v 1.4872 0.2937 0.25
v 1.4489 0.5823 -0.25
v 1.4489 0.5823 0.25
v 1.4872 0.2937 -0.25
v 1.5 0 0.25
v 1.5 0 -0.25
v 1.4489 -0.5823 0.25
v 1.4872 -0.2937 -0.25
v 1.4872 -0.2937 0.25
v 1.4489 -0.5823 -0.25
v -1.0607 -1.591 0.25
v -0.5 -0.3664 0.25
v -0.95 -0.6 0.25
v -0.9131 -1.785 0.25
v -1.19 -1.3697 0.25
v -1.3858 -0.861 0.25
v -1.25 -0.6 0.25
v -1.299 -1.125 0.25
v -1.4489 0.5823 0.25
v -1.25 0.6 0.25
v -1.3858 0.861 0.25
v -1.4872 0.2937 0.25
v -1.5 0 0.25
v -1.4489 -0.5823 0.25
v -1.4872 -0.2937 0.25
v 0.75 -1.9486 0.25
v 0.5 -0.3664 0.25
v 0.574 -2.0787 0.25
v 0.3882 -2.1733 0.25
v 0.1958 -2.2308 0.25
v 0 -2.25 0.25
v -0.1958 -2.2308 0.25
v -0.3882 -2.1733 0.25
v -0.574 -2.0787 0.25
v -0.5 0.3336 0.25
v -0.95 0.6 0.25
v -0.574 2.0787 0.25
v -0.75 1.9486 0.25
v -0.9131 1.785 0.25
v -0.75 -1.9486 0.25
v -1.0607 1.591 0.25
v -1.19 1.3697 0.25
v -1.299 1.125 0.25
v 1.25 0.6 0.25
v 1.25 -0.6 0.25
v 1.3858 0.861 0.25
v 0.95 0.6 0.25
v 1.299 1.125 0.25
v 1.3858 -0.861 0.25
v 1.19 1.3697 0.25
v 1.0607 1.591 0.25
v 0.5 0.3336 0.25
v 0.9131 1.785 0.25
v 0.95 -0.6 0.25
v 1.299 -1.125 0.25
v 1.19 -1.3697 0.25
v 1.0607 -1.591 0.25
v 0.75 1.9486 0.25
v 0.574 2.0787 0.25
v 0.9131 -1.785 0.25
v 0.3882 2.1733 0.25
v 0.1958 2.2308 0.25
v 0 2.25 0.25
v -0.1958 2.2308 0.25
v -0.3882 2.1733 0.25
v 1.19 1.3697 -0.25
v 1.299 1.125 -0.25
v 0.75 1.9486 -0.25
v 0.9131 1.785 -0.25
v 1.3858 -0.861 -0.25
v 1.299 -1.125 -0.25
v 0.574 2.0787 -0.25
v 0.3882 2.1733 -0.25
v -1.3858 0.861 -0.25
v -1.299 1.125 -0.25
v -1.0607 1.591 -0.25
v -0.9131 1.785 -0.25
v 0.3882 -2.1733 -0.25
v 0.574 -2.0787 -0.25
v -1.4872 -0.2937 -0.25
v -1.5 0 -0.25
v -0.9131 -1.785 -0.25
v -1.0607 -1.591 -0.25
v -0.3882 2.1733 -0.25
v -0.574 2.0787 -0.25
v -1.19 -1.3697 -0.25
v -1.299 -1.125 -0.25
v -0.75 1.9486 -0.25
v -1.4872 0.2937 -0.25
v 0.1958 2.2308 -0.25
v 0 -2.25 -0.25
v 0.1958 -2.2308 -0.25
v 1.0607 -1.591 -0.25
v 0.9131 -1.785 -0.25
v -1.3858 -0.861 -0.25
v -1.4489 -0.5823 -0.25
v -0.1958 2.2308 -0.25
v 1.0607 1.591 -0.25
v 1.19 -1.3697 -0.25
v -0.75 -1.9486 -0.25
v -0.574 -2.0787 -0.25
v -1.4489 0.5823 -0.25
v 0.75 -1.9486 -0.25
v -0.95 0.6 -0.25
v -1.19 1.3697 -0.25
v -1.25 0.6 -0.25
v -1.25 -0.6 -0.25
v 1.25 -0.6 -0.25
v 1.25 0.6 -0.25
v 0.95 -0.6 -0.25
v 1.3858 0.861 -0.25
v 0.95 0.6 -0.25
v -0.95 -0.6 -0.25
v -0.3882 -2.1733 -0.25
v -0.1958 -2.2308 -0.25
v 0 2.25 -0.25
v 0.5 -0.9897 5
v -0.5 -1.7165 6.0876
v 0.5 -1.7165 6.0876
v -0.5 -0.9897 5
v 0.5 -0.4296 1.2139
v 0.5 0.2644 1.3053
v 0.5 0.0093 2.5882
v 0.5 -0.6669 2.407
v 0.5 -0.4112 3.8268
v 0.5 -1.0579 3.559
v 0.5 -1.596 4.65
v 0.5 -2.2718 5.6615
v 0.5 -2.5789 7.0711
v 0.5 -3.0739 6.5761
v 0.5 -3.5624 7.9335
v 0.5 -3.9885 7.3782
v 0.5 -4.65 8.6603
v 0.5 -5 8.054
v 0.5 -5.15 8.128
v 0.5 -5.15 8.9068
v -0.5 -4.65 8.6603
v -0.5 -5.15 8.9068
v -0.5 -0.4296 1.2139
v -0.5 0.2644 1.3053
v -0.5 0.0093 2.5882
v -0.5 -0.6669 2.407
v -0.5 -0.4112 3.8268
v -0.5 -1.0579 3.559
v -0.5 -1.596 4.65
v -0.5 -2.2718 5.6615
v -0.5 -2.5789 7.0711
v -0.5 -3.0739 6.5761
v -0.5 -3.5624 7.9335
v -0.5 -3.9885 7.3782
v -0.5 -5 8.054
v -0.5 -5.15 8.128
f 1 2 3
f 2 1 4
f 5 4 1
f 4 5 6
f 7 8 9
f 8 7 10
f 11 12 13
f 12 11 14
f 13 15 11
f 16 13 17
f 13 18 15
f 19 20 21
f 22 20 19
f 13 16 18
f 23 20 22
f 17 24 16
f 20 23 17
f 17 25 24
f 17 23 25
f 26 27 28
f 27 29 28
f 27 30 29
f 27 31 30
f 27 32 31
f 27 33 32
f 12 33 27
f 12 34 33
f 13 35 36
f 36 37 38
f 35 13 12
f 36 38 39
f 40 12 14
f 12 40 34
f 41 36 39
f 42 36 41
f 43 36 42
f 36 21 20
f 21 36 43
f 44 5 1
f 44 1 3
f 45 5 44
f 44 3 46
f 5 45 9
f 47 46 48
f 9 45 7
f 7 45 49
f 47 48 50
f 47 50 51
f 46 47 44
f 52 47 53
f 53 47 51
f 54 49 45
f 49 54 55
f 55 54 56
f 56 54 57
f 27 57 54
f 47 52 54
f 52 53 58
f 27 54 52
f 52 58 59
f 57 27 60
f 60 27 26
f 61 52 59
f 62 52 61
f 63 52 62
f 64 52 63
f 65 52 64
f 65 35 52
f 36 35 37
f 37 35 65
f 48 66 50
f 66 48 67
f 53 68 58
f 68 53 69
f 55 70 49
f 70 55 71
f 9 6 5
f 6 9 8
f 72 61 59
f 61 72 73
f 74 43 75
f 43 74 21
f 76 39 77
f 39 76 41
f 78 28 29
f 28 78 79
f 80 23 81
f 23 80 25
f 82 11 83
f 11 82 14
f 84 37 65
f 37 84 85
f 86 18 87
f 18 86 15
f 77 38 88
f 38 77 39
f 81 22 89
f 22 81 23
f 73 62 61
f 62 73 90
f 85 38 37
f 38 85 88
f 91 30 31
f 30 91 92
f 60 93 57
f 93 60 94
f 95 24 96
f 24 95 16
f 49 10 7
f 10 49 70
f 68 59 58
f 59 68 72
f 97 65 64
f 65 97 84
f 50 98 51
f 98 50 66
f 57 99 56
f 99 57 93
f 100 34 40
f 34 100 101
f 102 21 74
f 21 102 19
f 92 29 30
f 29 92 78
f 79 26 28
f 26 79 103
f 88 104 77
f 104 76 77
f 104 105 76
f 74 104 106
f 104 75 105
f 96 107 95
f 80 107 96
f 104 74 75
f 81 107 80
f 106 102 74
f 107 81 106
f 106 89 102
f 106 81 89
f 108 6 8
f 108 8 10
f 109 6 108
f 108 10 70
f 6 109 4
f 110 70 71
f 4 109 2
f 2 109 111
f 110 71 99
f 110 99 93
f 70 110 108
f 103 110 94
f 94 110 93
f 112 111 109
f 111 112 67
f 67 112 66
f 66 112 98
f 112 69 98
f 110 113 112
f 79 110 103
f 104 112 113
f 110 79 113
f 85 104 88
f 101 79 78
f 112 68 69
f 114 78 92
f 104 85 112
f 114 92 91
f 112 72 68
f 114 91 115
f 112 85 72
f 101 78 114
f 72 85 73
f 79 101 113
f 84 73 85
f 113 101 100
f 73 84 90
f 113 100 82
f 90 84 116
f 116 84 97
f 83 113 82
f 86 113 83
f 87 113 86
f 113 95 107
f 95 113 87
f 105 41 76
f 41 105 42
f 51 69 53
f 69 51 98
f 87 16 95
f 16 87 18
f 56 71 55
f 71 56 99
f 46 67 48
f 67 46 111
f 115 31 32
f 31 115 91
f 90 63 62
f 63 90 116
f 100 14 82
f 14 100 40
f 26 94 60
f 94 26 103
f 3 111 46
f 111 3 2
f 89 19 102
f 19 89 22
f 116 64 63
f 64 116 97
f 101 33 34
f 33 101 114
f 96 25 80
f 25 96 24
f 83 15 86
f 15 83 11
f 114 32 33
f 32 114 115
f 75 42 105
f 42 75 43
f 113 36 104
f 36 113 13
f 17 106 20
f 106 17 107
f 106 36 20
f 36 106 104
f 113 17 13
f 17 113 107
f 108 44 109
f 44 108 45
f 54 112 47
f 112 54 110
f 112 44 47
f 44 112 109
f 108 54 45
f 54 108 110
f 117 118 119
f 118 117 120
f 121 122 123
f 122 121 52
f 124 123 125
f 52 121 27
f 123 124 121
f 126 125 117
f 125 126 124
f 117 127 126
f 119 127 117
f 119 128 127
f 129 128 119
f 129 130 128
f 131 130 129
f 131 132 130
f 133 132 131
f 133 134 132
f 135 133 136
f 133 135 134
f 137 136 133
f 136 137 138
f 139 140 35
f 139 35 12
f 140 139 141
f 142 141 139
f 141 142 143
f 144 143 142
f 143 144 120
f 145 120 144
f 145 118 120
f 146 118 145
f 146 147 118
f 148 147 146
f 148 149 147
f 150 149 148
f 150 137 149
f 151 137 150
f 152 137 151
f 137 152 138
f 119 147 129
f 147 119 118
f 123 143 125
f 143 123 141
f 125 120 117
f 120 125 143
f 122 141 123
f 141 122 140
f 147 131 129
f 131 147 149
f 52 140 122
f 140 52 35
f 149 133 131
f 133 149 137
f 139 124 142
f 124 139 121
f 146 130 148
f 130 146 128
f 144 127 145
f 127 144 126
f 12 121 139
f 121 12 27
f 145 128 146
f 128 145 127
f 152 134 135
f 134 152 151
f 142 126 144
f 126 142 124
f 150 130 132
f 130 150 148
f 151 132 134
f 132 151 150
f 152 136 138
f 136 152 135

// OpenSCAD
// Generated by SolidPython 1.1.3 on 2024-04-22 09:59:14
$fn = 48;


union() {
	union() {
		difference() {
			difference() {
				scale(v = [1, 1.5000000000, 1]) {
					cylinder(center = true, h = 0.5000000000, r = 1.5000000000);
				}
				translate(v = [-1.1000000000, 0, 0]) {
					cube(center = true, size = [0.3000000000, 1.2000000000, 10]);
				}
			}
			translate(v = [1.1000000000, 0, 0]) {
				cube(center = true, size = [0.3000000000, 1.2000000000, 10]);
			}
		}
		translate(v = [0, -9.6500000000, 0]) {
			difference() {
				difference() {
					difference() {
						rotate(a = [0, 90, 0]) {
							cylinder(center = true, h = 1, r = 10);
						}
						rotate(a = [0, 90, 0]) {
							cylinder(center = true, h = 100, r = 9.3000000000);
						}
					}
					translate(v = [0, -3, 0]) {
						cube(center = true, size = [10, 15, 100]);
					}
				}
				translate(v = [0, 5, -5]) {
					cube(center = true, size = [100, 100, 10]);
				}
			}
		}
	}
}
/***********************************************
*********      SolidPython code:      **********
************************************************
 
#! /usr/bin/env python3
import sys
import numpy as np
from solid import scad_render_to_file, difference
from solid.objects import cube, translate, union, rotate, color, cylinder, scale


SEGMENTS = 48

def basic_geometry():

    shapes = []
    thumb_base = scale((1, 1.5, 1))(cylinder(h=.5, r=1.5, center=True))
    tmp = translate([-1.1, 0, 0])(cube([.3, 1.2, 10], center=True))
    thumb_base = difference()(thumb_base, tmp)
    tmp = translate([1.1, 0, 0])(cube([.3, 1.2, 10], center=True))
    thumb_base = difference()(thumb_base, tmp)

    angle = rotate((0, 90, 0))(cylinder(h=1, r=10, center=True))
    tmp = rotate((0, 90, 0))(cylinder(h=100, r=9.3, center=True))
    angle = difference()(angle, tmp)
    tmp = translate([0, -3, 0])(cube([10, 15, 100], center=True))
    angle = difference()(angle, tmp)
    tmp = translate([0, 5, -5])(cube([100, 100, 10], center=True))
    angle = difference()(angle, tmp)
    angle = translate([0, -9.65, 0])(angle)

    thumb_base = union()(thumb_base, angle)
    shapes.append(thumb_base)
    return union()(*shapes)

if __name__ == '__main__':
    out_dir = sys.argv[1] if len(sys.argv) > 1 else None

    a = basic_geometry()

    # Adding the file_header argument as shown allows you to change
    # the detail of arcs by changing the SEGMENTS variable.  This can
    # be expensive when making lots of small curves, but is otherwise
    # useful.
    file_out = scad_render_to_file(a, out_dir=out_dir, file_header=f'$fn = {SEGMENTS};')
    print(f"{__file__}: SCAD file written to: \n{file_out}")
 
 
************************************************/
